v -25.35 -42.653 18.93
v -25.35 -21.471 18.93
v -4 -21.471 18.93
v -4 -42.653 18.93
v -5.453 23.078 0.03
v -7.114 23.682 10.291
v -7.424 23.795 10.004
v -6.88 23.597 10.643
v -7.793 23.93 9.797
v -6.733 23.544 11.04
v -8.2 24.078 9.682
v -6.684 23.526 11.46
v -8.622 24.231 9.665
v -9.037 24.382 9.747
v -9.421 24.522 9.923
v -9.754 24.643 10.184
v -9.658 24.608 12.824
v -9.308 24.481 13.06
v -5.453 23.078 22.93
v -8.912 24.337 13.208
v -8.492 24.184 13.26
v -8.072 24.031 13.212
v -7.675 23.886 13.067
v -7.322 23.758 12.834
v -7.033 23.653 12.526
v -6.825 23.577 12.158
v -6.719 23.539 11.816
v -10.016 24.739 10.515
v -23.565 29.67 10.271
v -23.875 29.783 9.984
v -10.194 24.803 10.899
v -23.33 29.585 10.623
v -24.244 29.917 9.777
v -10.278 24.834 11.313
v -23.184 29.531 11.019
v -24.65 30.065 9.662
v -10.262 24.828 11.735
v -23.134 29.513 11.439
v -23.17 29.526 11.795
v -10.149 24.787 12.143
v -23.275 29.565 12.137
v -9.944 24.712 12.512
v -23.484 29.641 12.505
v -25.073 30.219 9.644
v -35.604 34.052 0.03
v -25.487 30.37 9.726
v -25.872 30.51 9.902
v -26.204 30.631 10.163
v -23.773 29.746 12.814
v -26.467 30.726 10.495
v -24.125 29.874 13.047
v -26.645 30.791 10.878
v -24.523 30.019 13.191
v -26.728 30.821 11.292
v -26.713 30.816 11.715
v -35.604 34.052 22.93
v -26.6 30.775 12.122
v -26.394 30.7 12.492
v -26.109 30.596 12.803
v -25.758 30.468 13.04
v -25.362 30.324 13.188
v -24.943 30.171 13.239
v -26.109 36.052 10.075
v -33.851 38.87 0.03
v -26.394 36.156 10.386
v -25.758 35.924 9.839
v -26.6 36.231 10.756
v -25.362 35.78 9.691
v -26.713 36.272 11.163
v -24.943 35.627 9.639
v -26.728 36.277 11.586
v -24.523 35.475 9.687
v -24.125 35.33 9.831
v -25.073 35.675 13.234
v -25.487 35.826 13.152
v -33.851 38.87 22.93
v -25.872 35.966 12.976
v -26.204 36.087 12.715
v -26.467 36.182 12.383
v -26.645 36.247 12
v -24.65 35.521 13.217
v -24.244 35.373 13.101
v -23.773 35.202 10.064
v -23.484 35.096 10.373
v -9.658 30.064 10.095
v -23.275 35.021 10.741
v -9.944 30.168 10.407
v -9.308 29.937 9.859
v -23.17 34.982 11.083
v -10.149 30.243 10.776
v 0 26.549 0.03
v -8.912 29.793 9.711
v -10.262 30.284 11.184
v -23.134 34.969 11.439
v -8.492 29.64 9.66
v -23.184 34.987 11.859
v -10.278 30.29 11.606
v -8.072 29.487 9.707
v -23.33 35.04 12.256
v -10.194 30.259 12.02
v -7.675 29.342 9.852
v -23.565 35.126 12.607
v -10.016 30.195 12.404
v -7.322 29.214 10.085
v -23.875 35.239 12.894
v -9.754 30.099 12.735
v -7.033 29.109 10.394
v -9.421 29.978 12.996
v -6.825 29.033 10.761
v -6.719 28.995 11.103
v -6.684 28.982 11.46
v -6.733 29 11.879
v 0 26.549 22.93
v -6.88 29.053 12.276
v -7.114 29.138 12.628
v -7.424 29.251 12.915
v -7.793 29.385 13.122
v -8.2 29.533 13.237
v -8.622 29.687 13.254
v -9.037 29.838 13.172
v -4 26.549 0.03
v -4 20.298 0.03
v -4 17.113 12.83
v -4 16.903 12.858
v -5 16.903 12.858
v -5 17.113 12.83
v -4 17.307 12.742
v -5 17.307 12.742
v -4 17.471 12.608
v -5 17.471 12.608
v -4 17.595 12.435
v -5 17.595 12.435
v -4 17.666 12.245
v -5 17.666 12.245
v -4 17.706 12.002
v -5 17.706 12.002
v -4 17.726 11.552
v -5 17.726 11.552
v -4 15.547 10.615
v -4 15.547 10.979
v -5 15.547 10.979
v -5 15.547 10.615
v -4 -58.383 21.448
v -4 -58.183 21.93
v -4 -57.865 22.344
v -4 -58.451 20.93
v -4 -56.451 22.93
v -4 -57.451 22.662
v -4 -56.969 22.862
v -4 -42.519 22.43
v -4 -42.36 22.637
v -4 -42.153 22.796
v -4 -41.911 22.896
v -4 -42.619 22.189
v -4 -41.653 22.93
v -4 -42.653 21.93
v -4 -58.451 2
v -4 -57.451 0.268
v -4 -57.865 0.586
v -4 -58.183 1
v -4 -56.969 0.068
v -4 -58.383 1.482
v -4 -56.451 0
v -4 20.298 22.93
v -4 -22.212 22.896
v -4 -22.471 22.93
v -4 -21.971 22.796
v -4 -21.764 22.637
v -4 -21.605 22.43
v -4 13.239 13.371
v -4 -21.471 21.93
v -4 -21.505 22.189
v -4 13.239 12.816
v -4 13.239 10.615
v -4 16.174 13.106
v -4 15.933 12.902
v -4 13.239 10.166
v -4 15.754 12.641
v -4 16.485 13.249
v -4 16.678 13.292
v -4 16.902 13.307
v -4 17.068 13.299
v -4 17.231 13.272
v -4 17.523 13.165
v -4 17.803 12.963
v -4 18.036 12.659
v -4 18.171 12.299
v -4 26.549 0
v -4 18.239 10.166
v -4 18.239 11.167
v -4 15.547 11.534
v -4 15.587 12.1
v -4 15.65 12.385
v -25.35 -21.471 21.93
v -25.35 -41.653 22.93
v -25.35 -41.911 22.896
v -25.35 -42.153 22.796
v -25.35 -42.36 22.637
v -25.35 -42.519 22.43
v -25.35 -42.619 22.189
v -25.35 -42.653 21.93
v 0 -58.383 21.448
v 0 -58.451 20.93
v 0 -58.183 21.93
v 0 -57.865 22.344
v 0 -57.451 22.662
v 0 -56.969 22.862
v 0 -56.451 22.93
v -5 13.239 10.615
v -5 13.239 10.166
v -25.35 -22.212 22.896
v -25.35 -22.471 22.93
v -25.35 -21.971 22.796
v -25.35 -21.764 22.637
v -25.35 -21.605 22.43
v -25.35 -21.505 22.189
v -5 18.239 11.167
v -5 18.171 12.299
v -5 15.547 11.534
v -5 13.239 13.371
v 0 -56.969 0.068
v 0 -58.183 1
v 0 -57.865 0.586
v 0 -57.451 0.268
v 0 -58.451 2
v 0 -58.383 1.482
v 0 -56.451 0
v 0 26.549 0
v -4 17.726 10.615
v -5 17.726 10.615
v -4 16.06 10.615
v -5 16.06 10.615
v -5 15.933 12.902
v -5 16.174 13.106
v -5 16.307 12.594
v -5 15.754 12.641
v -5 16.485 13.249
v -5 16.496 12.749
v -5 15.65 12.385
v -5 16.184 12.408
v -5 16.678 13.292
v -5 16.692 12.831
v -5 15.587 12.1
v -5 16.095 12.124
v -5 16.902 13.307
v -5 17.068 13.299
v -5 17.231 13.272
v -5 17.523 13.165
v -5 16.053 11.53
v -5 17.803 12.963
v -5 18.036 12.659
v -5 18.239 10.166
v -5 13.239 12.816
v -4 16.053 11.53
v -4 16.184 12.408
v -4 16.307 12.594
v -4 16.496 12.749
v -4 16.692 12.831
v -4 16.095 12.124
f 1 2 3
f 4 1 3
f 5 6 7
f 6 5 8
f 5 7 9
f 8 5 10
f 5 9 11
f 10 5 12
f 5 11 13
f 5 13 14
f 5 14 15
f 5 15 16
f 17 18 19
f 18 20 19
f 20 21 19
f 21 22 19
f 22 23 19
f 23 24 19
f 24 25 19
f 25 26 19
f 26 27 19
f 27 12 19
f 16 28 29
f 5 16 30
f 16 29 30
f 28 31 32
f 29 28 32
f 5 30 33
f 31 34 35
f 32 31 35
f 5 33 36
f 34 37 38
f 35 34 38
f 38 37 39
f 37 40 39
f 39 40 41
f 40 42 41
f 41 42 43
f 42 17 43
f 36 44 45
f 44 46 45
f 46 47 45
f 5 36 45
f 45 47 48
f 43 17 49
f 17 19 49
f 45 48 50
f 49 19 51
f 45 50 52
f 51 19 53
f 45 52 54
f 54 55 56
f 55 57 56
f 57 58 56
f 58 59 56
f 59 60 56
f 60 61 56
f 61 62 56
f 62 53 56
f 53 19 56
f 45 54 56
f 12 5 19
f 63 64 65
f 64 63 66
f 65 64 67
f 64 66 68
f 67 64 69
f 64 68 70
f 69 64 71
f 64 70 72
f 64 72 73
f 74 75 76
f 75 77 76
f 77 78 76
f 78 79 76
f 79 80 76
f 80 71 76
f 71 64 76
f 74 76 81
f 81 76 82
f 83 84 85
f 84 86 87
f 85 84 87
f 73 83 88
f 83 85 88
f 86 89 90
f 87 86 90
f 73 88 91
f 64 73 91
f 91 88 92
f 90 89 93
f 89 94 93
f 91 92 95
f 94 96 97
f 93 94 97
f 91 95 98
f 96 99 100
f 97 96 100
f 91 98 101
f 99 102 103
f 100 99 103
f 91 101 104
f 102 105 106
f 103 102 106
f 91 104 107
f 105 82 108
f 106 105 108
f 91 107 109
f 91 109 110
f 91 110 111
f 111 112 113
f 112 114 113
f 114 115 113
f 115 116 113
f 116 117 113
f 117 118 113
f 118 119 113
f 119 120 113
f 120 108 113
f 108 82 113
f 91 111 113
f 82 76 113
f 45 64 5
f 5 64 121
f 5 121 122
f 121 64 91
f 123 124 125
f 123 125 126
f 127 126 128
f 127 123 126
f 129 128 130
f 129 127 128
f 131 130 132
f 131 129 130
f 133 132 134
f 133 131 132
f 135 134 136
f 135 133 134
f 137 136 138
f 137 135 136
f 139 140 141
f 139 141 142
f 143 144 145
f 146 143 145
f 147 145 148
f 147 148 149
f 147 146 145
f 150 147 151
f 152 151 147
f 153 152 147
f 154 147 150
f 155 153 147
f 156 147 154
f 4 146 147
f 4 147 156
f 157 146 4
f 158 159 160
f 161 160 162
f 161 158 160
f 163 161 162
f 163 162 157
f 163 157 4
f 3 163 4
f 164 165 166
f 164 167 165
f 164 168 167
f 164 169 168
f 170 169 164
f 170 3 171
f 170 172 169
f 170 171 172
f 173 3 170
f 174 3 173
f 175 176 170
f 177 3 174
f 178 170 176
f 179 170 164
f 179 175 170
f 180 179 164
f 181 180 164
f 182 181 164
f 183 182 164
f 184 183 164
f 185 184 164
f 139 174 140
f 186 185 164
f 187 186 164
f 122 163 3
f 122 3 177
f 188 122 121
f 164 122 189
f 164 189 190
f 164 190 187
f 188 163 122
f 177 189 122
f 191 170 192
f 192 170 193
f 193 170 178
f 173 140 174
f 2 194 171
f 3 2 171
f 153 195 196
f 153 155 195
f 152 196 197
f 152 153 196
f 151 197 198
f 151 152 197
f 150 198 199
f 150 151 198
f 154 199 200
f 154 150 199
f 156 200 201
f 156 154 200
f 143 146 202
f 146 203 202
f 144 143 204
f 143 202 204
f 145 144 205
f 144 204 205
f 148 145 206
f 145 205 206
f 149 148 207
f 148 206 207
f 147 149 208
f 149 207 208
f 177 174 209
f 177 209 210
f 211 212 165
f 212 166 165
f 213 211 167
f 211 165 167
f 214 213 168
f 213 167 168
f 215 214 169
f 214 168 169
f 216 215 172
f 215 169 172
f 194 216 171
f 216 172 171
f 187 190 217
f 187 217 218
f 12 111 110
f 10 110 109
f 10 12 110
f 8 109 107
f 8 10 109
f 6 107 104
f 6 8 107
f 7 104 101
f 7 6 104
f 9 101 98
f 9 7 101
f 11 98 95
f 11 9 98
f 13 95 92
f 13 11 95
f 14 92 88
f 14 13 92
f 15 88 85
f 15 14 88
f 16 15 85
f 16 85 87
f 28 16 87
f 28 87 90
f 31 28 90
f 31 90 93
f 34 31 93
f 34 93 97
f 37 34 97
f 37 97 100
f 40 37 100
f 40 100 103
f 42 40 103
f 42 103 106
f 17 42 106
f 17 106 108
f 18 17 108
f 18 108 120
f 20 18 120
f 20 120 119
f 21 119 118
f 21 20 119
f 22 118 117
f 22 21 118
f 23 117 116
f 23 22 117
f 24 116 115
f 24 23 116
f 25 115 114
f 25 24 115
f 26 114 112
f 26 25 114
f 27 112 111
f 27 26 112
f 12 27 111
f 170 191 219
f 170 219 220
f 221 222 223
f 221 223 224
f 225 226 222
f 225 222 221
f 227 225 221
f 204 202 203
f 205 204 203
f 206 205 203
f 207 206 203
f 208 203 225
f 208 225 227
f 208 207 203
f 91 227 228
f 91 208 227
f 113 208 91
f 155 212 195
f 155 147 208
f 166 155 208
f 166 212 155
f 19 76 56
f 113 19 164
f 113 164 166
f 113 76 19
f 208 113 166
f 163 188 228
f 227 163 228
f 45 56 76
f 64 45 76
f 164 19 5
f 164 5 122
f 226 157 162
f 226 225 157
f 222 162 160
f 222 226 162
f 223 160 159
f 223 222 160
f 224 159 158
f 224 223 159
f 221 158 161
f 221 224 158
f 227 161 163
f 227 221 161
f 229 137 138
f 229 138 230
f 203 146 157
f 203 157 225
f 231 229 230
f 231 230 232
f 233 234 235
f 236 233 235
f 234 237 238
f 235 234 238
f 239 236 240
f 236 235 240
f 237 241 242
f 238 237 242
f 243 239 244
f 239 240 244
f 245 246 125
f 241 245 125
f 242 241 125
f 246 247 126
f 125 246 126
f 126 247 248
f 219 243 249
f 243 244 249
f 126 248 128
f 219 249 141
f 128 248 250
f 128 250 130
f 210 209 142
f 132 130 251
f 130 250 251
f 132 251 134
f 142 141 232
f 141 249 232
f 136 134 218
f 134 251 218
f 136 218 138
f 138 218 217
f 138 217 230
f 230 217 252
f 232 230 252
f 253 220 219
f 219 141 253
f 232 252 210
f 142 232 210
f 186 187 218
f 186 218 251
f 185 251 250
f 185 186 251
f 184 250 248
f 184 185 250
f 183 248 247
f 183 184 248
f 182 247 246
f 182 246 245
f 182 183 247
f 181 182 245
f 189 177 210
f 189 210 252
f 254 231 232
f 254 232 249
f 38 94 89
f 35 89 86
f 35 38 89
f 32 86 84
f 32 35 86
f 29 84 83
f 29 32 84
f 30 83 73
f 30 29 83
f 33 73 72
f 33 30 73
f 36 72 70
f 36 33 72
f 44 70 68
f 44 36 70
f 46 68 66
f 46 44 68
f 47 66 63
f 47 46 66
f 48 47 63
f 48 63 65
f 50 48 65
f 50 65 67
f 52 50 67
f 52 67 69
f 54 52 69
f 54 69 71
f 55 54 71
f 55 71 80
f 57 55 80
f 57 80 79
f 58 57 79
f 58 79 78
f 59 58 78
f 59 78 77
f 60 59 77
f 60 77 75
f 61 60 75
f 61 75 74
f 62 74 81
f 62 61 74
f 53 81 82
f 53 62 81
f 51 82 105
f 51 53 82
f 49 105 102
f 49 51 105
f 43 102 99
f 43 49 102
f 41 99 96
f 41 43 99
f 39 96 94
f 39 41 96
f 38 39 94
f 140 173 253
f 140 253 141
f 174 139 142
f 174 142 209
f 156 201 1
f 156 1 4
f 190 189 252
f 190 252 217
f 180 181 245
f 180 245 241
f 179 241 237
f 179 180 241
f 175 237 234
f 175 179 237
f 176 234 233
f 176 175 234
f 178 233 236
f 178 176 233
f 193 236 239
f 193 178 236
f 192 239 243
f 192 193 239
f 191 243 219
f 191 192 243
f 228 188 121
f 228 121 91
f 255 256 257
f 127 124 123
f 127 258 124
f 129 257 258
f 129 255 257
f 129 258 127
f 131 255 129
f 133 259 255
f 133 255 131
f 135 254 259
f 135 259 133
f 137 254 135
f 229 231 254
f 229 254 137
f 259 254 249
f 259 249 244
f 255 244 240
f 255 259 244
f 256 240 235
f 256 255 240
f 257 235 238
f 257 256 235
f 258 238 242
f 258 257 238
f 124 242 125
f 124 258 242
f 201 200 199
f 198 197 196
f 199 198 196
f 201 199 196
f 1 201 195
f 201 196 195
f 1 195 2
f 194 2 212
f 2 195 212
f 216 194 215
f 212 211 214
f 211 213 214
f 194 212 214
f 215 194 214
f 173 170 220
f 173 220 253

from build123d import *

# Parameters (mm, degrees)
ESQUISSE1_W             = 4
ESQUISSE1_H             = 85
BOSS_EXTRU_1_DEPTH      = 22.93
BOSS_EXTRU_5_DEPTH      = 22.9
ESQUISSE5_W             = 25.35
ESQUISSE5_H             = 21.181614094
BOSS_EXTRU_6_DEPTH      = 4
CONG_1_R                = 2
CONG_5_R                = 1
ESQUISSE9_R             = 1.8
ENL_V_MAT_EXTRU_1_DEPTH = 58
BOSS_EXTRU_8_DEPTH      = 1
BOSS_EXTRU_9_DEPTH      = 22.9


with BuildPart() as part:
    # Esquisse1 → Boss.-Extru.1 (new body)
    with BuildSketch(Plane.XY):
        with Locations((-2, -15.95097561)):
            Rectangle(ESQUISSE1_W, ESQUISSE1_H)
    extrude(amount=BOSS_EXTRU_1_DEPTH)

    # Esquisse2 → Boss.-Extru.5 (add)
    with BuildSketch(Plane.XY.offset(22.93)):
        Polygon((-33.850627534, 38.869645224), (0, 26.54902439), (0, 22.54902439), (-4, 22.54902439), (-35.604113867, 34.051981118), align=None)
    extrude(amount=-BOSS_EXTRU_5_DEPTH)

    # Esquisse5 → Boss.-Extru.6 (add)
    with BuildSketch(Plane.XY.offset(22.93)):
        with Locations((-12.675, -32.061782657)):
            Rectangle(ESQUISSE5_W, ESQUISSE5_H)
    extrude(amount=-BOSS_EXTRU_6_DEPTH)

    # Congé1
    cong_1_edges = [part.edges().sort_by_distance(p)[0] for p in [
        (-2, -58.45097561, 22.93),
        (-2, -58.45097561, 0),
    ]]
    fillet(cong_1_edges, radius=CONG_1_R)

    # Congé5
    cong_5_edges = [part.edges().sort_by_distance(p)[0] for p in [
        (-14.675, -21.47097561, 22.93),
        (-14.675, -42.652589704, 22.93),
    ]]
    fillet(cong_5_edges, radius=CONG_5_R)

    # Esquisse9 → Enlèv. mat.-Extru.1 (cut)
    with BuildSketch(Plane(origin=(0, 0, 0), x_dir=(1, 0, 0), z_dir=(0, 1, 0))):
        with Locations((-24.9342899, -11.439091382)):
            Circle(ESQUISSE9_R)
        with Locations((-8.483694977, -11.459545691)):
            Circle(ESQUISSE9_R)
    extrude(amount=ENL_V_MAT_EXTRU_1_DEPTH, mode=Mode.SUBTRACT)

    # Esquisse10 → Boss.-Extru.8 (add)
    with BuildSketch(Plane.ZY.offset(4)):
        with BuildLine():
            Line((10.166030362, 18.2390183), (11.166631323, 18.2390183))
            add(Edge.make_bspline(
                [(11.166631323, 18.2390183), (11.233404364, 18.238796034), (11.361615999, 18.238369259), (11.545292099, 18.235989598), (11.712187952, 18.22916909), (11.862216294, 18.223299685), (11.995374373, 18.212596912), (12.112070502, 18.202367416), (12.211767213, 18.188976472), (12.272118429, 18.176540153), (12.299443823, 18.170909326)],
                knots=[0, 0, 0, 0, 0.000200323, 0.000384642, 0.000551017, 0.000701421, 0.00083501, 0.000951717, 0.001052854, 0.001136534, 0.001136534, 0.001136534, 0.001136534], degree=3))
            add(Edge.make_bspline(
                [(12.299443823, 18.170909326), (12.336024715, 18.161871089), (12.408406128, 18.143987427), (12.512620508, 18.106187997), (12.611926685, 18.062445676), (12.705912149, 18.011068933), (12.794106136, 17.951676391), (12.877418009, 17.885293359), (12.956225814, 17.812283065), (13.027342428, 17.73080472), (13.094398216, 17.645323991), (13.150953397, 17.552890053), (13.199705511, 17.456230728), (13.238520535, 17.354362988), (13.269774783, 17.248274743), (13.291812268, 17.137005033), (13.30502825, 17.021060783), (13.306373758, 16.941978056), (13.307056003, 16.901878877)],
                knots=[0, 0, 0, 0, 0.000112973, 0.000223535, 0.000332046, 0.000438282, 0.0005444, 0.000650613, 0.000757615, 0.000866163, 0.000974744, 0.001083144, 0.001190647, 0.001299089, 0.001409706, 0.001522064, 0.001638977, 0.001759236, 0.001759236, 0.001759236, 0.001759236], degree=3))
            add(Edge.make_bspline(
                [(13.307056003, 16.901878877), (13.304957434, 16.835257299), (13.300862583, 16.705261345), (13.262683863, 16.516602943), (13.200145978, 16.340618207), (13.113969851, 16.177528725), (13.004227743, 16.030513517), (12.872335184, 15.901384295), (12.718218596, 15.793327277), (12.574748145, 15.718394699), (12.448013574, 15.67040483), (12.34368027, 15.636638603), (12.229870302, 15.610550081), (12.10767411, 15.587178464), (11.976583173, 15.569533186), (11.836911688, 15.55660948), (11.688560043, 15.548532268), (11.586647087, 15.547329403), (11.534219464, 15.546710608)],
                knots=[0, 0, 0, 0, 0.000199681, 0.000389629, 0.000574641, 0.000758347, 0.00094084, 0.00112287, 0.00130963, 0.001503603, 0.001606651, 0.001715936, 0.001832303, 0.001956651, 0.002089094, 0.002228924, 0.002377378, 0.002534658, 0.002534658, 0.002534658, 0.002534658], degree=3))
            Line((11.534219464, 15.546710608), (13.371158567, 13.2390183))
            Line((13.371158567, 13.2390183), (12.816270746, 13.2390183))
            Line((12.816270746, 13.2390183), (10.979331644, 15.546710608))
            Line((10.979331644, 15.546710608), (10.61474831, 15.546710608))
            Line((10.61474831, 15.546710608), (10.61474831, 13.2390183))
            Line((10.61474831, 13.2390183), (10.166030362, 13.2390183))
            Line((10.166030362, 13.2390183), (10.166030362, 18.2390183))
        make_face()
        with BuildLine():
            Line((10.61474831, 17.726197787), (10.61474831, 16.05953112))
            Line((10.61474831, 16.05953112), (11.530213054, 16.052519902))
            add(Edge.make_bspline(
                [(11.530213054, 16.052519902), (11.572955967, 16.052500993), (11.655803905, 16.052464341), (11.775661998, 16.058169736), (11.887262158, 16.06466019), (11.990177518, 16.074587827), (12.084454054, 16.087382215), (12.170044644, 16.103386478), (12.247089004, 16.122032282), (12.336944059, 16.150891747), (12.437281961, 16.196614631), (12.546326904, 16.263136772), (12.639187386, 16.346806942), (12.717641475, 16.442483308), (12.78068352, 16.547677949), (12.825129312, 16.661129905), (12.853332801, 16.779975045), (12.856659294, 16.861658056), (12.858338054, 16.902880479)],
                knots=[0, 0, 0, 0, 0.000128209, 0.000248506, 0.000359904, 0.000463555, 0.000558601, 0.000645233, 0.000724669, 0.000796254, 0.000928055, 0.001054503, 0.00117794, 0.001301056, 0.001424562, 0.001544156, 0.0016654, 0.001788926, 0.001788926, 0.001788926, 0.001788926], degree=3))
            add(Edge.make_bspline(
                [(12.858338054, 16.902880479), (12.856620738, 16.94308987), (12.853217645, 17.022770211), (12.82543369, 17.139421512), (12.778448859, 17.249517155), (12.715131376, 17.352609276), (12.637989726, 17.446188899), (12.547535708, 17.52625626), (12.446242572, 17.592326924), (12.351569432, 17.634547468), (12.266949128, 17.660432973), (12.193478185, 17.678648921), (12.110461789, 17.693283876), (12.017496848, 17.705009678), (11.914980232, 17.715088169), (11.802393588, 17.721876425), (11.680483902, 17.725896231), (11.595988286, 17.726094929), (11.55224831, 17.726197787)],
                knots=[0, 0, 0, 0, 0.00012053, 0.000238846, 0.000357345, 0.000478278, 0.000600621, 0.000719816, 0.000839275, 0.000962126, 0.001029286, 0.001104593, 0.001189072, 0.001282, 0.00138565, 0.001498049, 0.00162031, 0.001751524, 0.001751524, 0.001751524, 0.001751524], degree=3))
            Line((11.55224831, 17.726197787), (10.61474831, 17.726197787))
        make_face(mode=Mode.SUBTRACT)
    extrude(amount=BOSS_EXTRU_8_DEPTH)

    # Esquisse11 → Boss.-Extru.9 (add)
    with BuildSketch(Plane.XY.offset(22.93)):
        Polygon((-5.452843765, 23.077816276), (-4, 20.298440223), (-0.659211444, 23.077816276), align=None)
    extrude(amount=-BOSS_EXTRU_9_DEPTH)


solid = part.part
